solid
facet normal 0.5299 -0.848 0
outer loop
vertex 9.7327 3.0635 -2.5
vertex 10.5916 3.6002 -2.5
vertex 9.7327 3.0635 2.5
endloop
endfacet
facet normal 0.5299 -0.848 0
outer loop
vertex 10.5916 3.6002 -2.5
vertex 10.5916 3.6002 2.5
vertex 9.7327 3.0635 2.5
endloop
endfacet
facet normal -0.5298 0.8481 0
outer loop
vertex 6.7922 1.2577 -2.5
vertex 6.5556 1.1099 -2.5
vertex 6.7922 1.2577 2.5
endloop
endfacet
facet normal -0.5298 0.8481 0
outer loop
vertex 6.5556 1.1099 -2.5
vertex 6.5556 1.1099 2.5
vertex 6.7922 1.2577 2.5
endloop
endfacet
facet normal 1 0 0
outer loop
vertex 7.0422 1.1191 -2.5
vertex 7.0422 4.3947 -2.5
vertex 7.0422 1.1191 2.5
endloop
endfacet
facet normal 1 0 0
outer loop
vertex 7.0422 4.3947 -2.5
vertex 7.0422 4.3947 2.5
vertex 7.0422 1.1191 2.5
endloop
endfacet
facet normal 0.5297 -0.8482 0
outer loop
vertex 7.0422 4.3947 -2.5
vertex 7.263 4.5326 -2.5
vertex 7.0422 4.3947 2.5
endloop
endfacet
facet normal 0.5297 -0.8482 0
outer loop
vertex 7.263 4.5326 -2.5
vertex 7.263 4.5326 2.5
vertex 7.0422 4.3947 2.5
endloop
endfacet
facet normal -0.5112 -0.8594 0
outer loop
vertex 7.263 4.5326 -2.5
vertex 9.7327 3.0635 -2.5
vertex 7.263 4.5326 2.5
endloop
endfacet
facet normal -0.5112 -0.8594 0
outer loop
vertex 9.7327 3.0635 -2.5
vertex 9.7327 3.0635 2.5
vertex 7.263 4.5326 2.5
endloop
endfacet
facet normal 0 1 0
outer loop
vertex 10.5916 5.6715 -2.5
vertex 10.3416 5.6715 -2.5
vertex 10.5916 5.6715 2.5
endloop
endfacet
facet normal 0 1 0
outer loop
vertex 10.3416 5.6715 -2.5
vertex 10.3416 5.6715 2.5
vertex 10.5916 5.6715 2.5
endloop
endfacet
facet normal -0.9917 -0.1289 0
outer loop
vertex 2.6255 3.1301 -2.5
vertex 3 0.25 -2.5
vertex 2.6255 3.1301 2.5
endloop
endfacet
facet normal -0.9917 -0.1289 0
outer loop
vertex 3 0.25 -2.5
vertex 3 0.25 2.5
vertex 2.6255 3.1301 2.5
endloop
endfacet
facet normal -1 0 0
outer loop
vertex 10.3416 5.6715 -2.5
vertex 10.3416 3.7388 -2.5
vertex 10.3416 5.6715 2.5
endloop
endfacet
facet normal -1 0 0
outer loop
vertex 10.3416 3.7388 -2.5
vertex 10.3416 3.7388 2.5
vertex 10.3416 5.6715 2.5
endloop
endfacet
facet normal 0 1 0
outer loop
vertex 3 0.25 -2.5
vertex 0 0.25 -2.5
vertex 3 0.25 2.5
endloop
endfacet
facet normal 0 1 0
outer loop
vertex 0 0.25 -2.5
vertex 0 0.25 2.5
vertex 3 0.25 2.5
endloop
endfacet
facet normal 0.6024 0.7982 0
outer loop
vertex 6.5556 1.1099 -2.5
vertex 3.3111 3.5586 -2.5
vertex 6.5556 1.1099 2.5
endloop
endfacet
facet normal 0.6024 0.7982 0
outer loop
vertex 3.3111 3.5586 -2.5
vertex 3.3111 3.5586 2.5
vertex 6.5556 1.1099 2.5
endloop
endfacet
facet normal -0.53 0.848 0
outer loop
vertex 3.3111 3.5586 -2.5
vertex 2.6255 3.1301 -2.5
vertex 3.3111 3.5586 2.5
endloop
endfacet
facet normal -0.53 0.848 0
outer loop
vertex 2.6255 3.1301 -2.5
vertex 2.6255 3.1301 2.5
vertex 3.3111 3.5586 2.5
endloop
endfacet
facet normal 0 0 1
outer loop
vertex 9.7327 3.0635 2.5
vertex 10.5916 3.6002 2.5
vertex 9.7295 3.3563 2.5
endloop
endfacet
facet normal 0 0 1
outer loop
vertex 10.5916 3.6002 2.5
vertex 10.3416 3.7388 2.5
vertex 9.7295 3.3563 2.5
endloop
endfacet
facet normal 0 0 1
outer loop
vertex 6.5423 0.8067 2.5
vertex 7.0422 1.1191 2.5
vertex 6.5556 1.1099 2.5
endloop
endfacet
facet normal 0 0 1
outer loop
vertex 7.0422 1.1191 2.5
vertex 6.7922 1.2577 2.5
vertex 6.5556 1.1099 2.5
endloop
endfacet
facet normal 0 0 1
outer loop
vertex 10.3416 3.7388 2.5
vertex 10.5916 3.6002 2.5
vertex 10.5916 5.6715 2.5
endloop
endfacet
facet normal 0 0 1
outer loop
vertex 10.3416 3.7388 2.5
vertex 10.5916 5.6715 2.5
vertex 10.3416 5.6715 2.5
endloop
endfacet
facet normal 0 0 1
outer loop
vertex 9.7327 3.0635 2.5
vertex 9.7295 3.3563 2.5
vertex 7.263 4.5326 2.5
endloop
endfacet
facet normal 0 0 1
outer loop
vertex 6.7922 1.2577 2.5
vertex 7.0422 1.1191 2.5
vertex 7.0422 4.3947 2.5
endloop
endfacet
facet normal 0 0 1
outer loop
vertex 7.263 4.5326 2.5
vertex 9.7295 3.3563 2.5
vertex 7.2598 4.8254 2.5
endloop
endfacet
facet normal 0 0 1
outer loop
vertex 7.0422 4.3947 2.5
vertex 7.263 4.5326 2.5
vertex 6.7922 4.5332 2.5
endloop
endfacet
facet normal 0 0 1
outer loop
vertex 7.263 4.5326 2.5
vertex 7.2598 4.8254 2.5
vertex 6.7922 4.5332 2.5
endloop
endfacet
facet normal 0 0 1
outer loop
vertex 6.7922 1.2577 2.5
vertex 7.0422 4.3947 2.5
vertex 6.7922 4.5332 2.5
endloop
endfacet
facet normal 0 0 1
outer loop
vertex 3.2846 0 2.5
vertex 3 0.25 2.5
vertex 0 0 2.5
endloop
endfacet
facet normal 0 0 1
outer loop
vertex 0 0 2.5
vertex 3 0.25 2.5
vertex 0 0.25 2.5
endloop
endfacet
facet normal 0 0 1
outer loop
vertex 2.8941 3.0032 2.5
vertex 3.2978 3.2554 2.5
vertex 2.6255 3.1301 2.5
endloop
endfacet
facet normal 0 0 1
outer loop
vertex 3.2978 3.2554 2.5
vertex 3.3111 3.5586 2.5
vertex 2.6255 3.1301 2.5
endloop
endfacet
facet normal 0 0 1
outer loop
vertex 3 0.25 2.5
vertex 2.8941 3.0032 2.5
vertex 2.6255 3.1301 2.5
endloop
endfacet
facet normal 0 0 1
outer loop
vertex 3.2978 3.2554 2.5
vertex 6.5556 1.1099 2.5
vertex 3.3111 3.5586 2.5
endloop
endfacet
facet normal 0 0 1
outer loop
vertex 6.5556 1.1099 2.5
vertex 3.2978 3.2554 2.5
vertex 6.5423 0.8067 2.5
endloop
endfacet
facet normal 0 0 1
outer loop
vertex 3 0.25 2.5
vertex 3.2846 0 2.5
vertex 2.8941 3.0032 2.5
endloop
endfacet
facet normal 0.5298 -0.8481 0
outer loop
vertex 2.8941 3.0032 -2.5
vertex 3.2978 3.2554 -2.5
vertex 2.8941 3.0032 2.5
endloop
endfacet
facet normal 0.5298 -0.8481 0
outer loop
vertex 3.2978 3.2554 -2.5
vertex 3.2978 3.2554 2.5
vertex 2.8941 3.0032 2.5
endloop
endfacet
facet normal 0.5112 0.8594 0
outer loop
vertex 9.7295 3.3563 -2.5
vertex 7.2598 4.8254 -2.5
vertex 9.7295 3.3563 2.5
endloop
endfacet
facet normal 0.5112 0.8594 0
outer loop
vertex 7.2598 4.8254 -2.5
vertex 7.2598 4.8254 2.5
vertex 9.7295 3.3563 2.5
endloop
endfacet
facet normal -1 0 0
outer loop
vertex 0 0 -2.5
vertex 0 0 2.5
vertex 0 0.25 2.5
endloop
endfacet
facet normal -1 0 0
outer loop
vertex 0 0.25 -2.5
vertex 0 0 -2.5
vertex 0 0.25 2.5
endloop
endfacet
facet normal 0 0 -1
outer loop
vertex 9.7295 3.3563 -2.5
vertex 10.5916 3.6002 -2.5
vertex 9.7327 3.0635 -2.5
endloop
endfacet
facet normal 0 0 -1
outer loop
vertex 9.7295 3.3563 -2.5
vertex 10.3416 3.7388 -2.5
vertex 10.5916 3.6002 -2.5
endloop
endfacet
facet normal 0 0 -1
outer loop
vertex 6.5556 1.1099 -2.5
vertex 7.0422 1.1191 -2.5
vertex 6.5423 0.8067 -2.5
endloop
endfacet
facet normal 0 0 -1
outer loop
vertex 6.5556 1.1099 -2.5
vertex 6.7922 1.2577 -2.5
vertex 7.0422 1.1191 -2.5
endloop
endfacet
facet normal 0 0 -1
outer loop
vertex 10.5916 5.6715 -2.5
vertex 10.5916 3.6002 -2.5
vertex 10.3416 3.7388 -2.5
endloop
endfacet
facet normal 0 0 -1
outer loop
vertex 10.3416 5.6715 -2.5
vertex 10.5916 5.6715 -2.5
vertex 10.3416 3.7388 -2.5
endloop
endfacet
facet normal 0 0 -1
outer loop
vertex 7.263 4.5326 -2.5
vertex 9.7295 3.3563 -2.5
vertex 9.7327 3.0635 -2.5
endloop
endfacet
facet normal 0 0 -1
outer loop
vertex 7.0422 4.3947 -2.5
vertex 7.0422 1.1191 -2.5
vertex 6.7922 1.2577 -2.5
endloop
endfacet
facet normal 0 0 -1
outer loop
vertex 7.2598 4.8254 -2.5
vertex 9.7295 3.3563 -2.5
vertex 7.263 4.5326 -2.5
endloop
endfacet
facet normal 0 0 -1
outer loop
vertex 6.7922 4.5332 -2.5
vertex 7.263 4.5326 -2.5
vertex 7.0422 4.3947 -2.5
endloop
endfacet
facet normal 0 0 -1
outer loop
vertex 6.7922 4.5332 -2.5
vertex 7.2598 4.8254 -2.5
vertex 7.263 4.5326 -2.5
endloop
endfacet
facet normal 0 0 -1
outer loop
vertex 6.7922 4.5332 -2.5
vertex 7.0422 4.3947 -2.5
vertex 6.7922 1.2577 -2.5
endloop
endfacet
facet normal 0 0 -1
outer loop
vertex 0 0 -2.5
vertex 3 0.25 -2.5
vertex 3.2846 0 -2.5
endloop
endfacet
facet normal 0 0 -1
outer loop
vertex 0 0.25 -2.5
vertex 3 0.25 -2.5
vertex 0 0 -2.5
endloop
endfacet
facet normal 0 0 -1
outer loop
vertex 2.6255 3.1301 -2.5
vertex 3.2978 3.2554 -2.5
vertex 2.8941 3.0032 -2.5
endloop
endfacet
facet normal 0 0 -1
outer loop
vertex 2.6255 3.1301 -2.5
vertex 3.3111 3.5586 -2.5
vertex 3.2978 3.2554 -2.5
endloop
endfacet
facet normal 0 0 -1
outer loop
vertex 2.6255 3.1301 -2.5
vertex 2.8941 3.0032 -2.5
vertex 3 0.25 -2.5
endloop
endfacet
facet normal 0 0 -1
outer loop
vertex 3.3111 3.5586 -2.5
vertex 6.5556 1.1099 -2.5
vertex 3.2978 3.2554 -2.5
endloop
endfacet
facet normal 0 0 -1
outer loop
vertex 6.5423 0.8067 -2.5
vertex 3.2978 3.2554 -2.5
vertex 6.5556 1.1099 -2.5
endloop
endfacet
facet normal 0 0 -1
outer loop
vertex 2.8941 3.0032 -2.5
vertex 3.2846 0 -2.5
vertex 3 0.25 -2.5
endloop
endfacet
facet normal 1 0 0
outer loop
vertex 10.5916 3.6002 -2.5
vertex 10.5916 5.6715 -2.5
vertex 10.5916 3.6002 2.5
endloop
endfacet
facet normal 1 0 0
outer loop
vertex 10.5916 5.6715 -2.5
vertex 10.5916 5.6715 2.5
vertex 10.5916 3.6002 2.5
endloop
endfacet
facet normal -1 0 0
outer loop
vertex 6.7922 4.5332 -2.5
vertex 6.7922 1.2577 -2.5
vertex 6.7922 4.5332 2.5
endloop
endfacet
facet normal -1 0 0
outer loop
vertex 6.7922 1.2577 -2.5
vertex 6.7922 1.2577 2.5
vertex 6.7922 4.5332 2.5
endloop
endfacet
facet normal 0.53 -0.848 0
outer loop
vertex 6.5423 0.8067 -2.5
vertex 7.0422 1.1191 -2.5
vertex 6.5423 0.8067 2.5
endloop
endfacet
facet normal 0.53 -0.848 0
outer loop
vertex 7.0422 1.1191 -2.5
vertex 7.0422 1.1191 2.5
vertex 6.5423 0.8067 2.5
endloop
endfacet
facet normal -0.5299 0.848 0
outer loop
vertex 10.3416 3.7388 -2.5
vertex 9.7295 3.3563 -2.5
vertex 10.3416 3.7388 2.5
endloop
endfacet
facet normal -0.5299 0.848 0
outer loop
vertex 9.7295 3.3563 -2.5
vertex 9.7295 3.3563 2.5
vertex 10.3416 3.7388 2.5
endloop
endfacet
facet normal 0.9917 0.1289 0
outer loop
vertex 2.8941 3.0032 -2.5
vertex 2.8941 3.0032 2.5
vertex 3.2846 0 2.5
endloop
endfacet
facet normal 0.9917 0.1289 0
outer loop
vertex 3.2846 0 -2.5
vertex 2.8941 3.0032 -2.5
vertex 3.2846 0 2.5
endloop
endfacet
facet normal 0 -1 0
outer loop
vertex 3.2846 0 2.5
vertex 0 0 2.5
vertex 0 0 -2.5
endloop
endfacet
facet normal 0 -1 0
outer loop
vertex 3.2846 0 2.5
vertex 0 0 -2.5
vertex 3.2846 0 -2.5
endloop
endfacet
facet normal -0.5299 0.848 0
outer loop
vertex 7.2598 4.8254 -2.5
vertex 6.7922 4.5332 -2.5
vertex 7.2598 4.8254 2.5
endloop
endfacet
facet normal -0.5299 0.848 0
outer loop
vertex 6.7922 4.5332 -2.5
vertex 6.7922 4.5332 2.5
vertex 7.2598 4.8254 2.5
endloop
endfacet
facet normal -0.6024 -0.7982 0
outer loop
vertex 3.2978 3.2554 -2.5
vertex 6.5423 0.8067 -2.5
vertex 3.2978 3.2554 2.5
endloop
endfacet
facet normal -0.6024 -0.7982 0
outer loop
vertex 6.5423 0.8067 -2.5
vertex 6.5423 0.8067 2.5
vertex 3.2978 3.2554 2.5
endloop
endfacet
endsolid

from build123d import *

# Parameters (mm, degrees)
BOSS_EXTRUDE1_DEPTH = 2.5


with BuildPart() as part:
    # frame_outline → Boss-Extrude1 (new, symmetric)
    with BuildSketch(Plane.XY):
        Polygon((0, 0), (0, 0.25), (3, 0.25), (2.625519601, 3.130114195), (3.311145122, 3.558555133), (6.555598399, 1.109884861), (6.792166473, 1.257714025), (6.792166473, 4.533228245), (7.259759156, 4.825422514), (9.729524263, 3.356316312), (10.341620659, 3.738809591), (10.341620659, 5.671508671), (10.591620659, 5.671508671), (10.591620659, 3.600234825), (9.732731436, 3.063523029), (7.262966329, 4.532629231), (7.042166473, 4.394653478), (7.042166473, 1.119139258), (6.542252093, 0.806747465), (3.297798816, 3.255417737), (2.894129781, 3.003168755), (3.284610073, 0), (3, 0), align=None)
    extrude(amount=BOSS_EXTRUDE1_DEPTH, both=True)


solid = part.part
